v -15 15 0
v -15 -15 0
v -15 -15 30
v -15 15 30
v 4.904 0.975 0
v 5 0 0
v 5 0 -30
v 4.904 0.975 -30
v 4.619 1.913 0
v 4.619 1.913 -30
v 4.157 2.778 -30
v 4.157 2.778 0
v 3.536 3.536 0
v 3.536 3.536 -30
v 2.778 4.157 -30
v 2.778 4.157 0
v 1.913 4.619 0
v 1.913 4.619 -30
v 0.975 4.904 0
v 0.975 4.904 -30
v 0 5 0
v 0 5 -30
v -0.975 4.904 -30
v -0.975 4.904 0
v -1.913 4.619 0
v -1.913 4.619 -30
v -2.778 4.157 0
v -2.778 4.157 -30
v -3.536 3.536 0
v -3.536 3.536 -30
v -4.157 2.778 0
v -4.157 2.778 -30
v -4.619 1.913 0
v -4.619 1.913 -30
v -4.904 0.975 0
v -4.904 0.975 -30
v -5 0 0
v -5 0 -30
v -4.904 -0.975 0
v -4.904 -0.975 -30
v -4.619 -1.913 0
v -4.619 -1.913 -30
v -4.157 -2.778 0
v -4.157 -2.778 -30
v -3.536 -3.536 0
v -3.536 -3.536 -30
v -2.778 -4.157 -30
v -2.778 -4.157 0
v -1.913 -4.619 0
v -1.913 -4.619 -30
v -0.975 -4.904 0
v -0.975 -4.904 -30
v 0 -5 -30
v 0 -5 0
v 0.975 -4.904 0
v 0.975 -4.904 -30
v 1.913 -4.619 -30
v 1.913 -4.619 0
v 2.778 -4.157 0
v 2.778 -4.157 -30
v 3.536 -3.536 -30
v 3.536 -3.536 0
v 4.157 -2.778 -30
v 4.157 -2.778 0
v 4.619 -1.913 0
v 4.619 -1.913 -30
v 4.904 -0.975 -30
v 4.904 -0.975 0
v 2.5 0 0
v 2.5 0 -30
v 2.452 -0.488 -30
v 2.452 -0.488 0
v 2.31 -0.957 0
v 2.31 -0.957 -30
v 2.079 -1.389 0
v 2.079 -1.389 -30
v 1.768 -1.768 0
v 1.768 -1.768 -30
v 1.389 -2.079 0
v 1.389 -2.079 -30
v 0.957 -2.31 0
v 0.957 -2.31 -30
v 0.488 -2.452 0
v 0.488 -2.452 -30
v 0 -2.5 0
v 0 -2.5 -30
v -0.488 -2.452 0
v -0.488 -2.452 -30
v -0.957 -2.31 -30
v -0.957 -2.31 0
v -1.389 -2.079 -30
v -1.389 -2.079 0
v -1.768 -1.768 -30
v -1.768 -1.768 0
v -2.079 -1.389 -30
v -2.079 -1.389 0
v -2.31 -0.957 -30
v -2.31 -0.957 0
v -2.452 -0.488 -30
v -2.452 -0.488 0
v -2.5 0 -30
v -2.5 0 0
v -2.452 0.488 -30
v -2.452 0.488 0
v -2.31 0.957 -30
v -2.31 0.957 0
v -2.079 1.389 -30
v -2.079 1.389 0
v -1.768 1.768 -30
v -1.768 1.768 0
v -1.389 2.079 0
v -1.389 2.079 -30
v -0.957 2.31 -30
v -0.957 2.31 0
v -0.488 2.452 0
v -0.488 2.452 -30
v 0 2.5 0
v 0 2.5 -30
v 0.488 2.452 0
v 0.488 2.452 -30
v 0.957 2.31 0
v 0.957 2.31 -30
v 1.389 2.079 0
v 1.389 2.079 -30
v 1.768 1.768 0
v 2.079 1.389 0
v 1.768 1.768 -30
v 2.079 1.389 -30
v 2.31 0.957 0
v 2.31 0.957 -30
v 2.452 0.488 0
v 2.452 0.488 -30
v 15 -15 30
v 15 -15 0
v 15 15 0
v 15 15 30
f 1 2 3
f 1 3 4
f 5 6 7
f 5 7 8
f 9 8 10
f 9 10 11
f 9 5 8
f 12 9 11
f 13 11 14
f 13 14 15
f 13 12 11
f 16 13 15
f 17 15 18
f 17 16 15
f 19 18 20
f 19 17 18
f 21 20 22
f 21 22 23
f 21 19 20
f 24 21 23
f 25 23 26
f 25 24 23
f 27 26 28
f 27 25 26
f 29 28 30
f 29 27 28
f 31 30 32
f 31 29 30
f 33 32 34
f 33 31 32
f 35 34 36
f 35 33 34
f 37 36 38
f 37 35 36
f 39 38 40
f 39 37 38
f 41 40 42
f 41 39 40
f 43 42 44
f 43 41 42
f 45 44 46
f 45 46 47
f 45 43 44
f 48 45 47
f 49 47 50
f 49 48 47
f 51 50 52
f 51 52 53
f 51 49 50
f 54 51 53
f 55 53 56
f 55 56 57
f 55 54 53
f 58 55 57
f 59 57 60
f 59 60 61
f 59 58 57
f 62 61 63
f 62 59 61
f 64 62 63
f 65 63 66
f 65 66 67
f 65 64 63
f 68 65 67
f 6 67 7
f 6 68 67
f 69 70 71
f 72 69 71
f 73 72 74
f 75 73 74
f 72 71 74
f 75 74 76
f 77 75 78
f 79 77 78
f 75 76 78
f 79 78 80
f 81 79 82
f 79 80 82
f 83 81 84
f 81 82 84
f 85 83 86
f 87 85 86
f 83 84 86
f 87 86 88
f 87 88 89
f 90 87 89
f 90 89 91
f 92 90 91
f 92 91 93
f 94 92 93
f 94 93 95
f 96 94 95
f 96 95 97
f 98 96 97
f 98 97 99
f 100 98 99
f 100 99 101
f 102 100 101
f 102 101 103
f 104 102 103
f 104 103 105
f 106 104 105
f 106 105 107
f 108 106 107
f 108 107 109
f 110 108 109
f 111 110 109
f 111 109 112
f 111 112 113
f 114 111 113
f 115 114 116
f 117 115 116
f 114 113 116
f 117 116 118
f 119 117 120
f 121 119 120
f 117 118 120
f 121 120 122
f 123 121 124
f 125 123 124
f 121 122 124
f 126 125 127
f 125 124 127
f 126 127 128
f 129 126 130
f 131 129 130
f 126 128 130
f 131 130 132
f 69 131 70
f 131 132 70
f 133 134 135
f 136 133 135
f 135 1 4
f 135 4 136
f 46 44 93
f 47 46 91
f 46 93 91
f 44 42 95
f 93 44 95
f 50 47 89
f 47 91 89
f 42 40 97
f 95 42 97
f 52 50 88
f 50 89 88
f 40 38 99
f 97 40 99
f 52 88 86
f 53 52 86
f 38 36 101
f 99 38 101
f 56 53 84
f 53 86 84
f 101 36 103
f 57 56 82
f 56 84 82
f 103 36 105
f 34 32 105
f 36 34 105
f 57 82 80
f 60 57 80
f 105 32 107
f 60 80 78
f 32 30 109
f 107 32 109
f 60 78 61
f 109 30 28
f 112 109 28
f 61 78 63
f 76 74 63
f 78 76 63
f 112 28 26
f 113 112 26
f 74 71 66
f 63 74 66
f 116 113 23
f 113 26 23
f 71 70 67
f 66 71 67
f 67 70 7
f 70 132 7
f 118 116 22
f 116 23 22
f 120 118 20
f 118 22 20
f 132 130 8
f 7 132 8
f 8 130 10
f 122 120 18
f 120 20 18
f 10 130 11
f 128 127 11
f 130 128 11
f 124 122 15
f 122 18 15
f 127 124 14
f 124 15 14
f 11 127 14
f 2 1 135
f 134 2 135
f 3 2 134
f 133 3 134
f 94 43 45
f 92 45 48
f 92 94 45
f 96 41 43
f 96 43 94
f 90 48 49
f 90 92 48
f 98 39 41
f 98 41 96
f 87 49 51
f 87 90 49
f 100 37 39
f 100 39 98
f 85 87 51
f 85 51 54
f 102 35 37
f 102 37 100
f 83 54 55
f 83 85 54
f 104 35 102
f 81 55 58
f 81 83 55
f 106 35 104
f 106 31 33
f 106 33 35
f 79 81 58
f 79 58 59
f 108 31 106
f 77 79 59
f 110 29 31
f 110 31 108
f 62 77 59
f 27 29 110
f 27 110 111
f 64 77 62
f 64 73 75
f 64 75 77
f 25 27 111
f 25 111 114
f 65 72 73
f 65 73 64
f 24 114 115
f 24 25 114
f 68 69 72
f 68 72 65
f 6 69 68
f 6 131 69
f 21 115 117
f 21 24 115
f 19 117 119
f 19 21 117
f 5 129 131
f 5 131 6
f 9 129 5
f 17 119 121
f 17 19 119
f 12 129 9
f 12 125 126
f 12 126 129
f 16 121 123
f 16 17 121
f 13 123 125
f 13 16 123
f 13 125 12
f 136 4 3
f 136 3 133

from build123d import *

# Parameters (mm, degrees)
F0_W     = 30
F0_H     = 30
F1_DEPTH = 30
F2_R     = 5
F3_DEPTH = 30
F4_R     = 2.5
F5_DEPTH = 70


with BuildPart() as f1:
    # F0 (on Top) → F1 (new body)
    with BuildSketch(Plane.XY):
        Rectangle(F0_W, F0_H)
    extrude(amount=F1_DEPTH)


with BuildPart() as f3:
    # F2 (on Top) → F3 (new body)
    with BuildSketch(Plane.XY):
        Circle(F2_R)
    extrude(amount=-F3_DEPTH)

    # F4 (on face) → F5 (cut)
    with BuildSketch(Plane(origin=(0, 0, -30), x_dir=(1, 0, 0), z_dir=(0, 0, -1))):
        Circle(F4_R)
    extrude(amount=-F5_DEPTH, mode=Mode.SUBTRACT)


solid = Compound([f1.part, f3.part])
